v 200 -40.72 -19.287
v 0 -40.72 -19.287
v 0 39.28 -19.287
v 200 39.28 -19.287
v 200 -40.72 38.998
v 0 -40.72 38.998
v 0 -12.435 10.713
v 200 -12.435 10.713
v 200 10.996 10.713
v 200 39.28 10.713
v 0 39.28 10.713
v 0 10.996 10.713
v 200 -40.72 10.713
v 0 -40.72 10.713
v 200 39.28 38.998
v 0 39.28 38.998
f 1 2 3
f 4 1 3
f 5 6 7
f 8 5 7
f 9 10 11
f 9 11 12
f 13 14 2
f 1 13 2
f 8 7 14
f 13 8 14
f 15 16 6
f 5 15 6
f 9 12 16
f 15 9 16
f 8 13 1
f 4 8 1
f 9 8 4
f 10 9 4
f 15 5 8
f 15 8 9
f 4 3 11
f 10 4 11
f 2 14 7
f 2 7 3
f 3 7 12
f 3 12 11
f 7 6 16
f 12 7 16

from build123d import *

# Parameters (mm, degrees)
F1_DEPTH = 200


with BuildPart() as f1:
    # F0 (on Right) → F1 (new body)
    with BuildSketch(Plane.YZ):
        Polygon((39.280485, 38.99768), (-40.719515, 38.99768), (-12.435243, 10.713409), (10.996214, 10.713409), align=None)
        Polygon((10.996214, 10.713409), (-12.435243, 10.713409), (-40.719515, 10.713409), (-40.719515, -19.286591), (39.280485, -19.286591), (39.280485, 10.713409), align=None)
    extrude(amount=F1_DEPTH)


solid = f1.part
